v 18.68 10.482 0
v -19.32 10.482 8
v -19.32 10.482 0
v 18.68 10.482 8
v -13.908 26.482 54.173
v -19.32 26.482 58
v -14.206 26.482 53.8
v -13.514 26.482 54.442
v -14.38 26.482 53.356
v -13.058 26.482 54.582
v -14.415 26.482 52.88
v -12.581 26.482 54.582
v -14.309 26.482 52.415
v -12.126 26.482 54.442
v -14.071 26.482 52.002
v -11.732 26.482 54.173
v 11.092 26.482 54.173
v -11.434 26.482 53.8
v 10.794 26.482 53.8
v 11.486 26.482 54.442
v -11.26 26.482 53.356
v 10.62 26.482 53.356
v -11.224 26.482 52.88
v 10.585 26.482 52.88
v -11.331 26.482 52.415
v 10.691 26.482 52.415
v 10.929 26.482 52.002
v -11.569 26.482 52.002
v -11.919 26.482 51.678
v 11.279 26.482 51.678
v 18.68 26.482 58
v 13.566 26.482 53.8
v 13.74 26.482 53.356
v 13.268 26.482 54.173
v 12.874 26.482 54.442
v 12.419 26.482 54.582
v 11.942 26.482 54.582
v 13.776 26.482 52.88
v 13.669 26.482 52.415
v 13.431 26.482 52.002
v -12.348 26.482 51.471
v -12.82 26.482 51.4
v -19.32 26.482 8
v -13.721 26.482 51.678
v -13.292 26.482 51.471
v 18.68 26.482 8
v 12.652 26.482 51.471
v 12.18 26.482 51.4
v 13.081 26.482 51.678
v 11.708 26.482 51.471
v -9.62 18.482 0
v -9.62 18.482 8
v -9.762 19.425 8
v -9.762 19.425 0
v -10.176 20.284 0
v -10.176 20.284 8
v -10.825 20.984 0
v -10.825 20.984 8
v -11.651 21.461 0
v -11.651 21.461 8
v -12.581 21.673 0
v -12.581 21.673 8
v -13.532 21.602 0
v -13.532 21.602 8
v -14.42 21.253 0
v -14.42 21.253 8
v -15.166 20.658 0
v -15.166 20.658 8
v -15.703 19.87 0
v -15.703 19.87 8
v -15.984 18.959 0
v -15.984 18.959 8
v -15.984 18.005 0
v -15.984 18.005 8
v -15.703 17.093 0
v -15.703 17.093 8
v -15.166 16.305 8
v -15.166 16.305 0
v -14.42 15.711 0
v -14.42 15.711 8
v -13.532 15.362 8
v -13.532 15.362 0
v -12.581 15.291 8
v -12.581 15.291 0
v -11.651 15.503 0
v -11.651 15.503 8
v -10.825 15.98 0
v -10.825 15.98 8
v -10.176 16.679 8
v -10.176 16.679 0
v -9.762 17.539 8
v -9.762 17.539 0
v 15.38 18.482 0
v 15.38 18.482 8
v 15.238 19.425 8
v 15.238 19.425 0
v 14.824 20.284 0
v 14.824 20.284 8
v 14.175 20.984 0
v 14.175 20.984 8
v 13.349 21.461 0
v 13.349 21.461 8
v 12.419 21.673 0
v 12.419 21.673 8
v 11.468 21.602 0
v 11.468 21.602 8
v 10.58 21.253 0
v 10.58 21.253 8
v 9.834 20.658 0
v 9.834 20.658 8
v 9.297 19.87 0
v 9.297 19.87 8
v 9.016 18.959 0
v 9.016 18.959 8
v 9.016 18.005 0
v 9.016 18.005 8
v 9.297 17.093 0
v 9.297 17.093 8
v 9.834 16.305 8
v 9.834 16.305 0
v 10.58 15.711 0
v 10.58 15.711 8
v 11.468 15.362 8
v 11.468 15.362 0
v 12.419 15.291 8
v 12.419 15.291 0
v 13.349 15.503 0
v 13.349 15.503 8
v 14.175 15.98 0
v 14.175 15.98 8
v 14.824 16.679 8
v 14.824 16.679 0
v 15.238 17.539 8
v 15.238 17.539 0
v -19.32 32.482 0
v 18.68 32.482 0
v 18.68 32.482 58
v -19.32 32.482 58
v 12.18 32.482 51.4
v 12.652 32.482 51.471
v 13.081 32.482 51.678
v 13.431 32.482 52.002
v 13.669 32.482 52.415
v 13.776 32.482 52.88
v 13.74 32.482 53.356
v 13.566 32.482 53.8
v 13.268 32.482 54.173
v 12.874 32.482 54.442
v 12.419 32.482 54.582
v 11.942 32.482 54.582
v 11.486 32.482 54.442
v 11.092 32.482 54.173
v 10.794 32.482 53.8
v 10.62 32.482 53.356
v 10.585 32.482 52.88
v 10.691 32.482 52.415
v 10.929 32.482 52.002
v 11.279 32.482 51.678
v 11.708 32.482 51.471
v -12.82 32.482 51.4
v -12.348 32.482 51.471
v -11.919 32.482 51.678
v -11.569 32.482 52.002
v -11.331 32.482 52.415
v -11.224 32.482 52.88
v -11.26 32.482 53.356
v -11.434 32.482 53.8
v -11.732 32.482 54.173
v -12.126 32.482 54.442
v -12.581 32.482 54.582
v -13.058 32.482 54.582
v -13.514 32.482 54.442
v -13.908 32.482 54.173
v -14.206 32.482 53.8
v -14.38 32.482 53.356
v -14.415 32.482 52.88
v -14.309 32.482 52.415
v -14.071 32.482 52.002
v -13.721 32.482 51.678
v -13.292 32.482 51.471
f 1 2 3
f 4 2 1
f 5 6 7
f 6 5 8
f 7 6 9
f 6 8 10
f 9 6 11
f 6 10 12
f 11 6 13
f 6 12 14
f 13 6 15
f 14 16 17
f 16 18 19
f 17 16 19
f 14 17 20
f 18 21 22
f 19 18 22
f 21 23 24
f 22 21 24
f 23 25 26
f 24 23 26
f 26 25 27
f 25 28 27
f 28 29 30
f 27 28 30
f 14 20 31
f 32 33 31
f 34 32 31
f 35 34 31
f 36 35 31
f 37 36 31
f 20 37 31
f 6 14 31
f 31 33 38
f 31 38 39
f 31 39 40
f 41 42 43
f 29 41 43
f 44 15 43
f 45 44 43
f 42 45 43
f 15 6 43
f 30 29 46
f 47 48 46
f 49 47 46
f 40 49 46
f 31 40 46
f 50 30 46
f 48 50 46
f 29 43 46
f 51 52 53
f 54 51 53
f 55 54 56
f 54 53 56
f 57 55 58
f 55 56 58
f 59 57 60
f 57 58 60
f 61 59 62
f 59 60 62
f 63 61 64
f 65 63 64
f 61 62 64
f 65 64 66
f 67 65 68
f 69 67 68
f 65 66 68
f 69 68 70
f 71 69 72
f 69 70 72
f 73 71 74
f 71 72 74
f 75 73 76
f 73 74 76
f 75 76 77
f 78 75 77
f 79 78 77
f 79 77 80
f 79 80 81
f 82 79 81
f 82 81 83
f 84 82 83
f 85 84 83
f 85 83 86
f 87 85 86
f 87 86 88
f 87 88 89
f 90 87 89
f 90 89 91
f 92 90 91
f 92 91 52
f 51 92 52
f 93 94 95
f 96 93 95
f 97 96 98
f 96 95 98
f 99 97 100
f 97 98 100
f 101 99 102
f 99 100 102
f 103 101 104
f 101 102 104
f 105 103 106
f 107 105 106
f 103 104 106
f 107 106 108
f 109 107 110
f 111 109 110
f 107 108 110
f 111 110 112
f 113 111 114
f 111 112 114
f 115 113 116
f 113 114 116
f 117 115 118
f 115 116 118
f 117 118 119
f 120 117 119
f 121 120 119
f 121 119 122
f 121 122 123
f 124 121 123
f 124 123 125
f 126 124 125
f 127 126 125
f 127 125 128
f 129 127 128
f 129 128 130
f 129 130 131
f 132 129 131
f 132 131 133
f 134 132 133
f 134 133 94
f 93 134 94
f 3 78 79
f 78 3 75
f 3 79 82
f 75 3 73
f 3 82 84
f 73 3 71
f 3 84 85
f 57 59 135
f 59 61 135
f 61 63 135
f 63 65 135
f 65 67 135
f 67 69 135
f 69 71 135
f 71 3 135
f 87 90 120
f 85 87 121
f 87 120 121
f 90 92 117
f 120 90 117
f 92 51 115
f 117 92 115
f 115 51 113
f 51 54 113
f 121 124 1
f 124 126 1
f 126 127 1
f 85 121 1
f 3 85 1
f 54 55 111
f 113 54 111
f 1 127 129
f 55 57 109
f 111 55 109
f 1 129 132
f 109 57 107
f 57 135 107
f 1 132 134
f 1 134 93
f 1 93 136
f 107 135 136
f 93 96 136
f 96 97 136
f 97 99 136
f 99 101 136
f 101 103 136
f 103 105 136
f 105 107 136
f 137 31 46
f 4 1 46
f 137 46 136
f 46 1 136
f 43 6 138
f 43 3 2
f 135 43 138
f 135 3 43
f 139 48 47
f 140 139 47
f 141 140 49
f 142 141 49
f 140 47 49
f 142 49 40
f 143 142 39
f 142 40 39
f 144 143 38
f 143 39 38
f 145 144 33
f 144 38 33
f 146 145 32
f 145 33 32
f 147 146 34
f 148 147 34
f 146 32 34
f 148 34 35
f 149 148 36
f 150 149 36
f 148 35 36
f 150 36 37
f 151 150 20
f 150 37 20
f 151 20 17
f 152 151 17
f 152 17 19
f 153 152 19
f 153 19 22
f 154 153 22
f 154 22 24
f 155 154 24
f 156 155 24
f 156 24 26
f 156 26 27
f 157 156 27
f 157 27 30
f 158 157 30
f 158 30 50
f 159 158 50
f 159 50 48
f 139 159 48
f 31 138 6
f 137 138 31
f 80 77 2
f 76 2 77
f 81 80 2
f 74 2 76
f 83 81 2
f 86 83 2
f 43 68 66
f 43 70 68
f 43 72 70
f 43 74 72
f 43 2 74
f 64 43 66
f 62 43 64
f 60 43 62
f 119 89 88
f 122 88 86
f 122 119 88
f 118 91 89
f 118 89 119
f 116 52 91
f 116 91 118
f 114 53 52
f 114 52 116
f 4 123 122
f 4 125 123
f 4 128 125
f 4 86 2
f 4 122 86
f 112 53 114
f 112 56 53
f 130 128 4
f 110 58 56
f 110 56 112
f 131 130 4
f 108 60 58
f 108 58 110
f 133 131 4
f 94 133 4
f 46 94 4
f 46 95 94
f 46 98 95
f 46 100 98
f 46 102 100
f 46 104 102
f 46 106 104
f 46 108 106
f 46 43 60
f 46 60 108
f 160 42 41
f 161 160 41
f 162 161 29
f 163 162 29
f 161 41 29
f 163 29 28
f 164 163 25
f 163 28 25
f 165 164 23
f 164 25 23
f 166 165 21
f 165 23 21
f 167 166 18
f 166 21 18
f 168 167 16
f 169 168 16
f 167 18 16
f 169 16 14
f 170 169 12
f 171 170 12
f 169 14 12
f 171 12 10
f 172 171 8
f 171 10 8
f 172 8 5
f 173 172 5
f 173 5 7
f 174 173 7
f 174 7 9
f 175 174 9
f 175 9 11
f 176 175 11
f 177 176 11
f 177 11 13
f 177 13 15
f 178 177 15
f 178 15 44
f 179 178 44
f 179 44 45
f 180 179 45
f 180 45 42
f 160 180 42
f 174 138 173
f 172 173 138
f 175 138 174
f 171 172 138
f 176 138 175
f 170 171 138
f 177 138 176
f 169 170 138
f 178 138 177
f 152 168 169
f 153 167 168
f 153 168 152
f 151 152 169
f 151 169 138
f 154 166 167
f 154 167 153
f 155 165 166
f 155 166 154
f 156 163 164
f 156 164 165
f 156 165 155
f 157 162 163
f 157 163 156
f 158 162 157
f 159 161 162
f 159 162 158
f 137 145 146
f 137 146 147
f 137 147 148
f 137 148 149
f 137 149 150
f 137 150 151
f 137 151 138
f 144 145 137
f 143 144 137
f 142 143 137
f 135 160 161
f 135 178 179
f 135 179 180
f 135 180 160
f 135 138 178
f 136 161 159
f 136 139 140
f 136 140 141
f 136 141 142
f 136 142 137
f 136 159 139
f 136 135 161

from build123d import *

# Parameters (mm, degrees)
SKETCH_1_W          = 38
SKETCH_1_H          = 38
EXTRUDE_1_DEPTH     = 8
SKETCH_2_W          = 38
SKETCH_2_H          = 6
EXTRUDE_2_DEPTH     = 50
SKETCH_3_W          = 38
SKETCH_3_H          = 16
CUT_EXTRUDE_1_DEPTH = 10
SKETCH_4_R          = 3.2
CUT_EXTRUDE_2_DEPTH = 10
SKETCH_5_R          = 1.6
CUT_EXTRUDE_3_DEPTH = 10


with BuildPart() as part:
    # 草图1 → 拉伸1 (new body)
    with BuildSketch(Plane.XY):
        with Locations((-0.319940249, 13.481833206)):
            Rectangle(SKETCH_1_W, SKETCH_1_H)
    extrude(amount=EXTRUDE_1_DEPTH)

    # 草图2 → 拉伸2 (add)
    with BuildSketch(Plane.XY.offset(8)):
        with Locations((-0.319940249, 29.481833206)):
            Rectangle(SKETCH_2_W, SKETCH_2_H)
    extrude(amount=EXTRUDE_2_DEPTH)

    # 草图3 → 切除-拉伸1 (cut)
    with BuildSketch(Plane.XY.offset(8)):
        with Locations((-0.319940249, 2.481833206)):
            Rectangle(SKETCH_3_W, SKETCH_3_H)
    extrude(amount=-CUT_EXTRUDE_1_DEPTH, mode=Mode.SUBTRACT)

    # 草图4 → 切除-拉伸2 (cut)
    with BuildSketch(Plane.XY.offset(8)):
        with Locations((-12.819940249, 18.481833206)):
            Circle(SKETCH_4_R)
        with Locations((12.180059751, 18.481833206)):
            Circle(SKETCH_4_R)
    extrude(amount=-CUT_EXTRUDE_2_DEPTH, mode=Mode.SUBTRACT)

    # 草图5 → 切除-拉伸3 (cut)
    with BuildSketch(Plane.XZ.offset(-26.481833206)):
        with Locations(Location((12.180059751, 53, 0), (0, 0, 270))):
            Circle(SKETCH_5_R)
        with Locations(Location((-12.819940249, 53, 0), (0, 0, 270))):
            Circle(SKETCH_5_R)
    extrude(amount=-CUT_EXTRUDE_3_DEPTH, mode=Mode.SUBTRACT)


solid = part.part
